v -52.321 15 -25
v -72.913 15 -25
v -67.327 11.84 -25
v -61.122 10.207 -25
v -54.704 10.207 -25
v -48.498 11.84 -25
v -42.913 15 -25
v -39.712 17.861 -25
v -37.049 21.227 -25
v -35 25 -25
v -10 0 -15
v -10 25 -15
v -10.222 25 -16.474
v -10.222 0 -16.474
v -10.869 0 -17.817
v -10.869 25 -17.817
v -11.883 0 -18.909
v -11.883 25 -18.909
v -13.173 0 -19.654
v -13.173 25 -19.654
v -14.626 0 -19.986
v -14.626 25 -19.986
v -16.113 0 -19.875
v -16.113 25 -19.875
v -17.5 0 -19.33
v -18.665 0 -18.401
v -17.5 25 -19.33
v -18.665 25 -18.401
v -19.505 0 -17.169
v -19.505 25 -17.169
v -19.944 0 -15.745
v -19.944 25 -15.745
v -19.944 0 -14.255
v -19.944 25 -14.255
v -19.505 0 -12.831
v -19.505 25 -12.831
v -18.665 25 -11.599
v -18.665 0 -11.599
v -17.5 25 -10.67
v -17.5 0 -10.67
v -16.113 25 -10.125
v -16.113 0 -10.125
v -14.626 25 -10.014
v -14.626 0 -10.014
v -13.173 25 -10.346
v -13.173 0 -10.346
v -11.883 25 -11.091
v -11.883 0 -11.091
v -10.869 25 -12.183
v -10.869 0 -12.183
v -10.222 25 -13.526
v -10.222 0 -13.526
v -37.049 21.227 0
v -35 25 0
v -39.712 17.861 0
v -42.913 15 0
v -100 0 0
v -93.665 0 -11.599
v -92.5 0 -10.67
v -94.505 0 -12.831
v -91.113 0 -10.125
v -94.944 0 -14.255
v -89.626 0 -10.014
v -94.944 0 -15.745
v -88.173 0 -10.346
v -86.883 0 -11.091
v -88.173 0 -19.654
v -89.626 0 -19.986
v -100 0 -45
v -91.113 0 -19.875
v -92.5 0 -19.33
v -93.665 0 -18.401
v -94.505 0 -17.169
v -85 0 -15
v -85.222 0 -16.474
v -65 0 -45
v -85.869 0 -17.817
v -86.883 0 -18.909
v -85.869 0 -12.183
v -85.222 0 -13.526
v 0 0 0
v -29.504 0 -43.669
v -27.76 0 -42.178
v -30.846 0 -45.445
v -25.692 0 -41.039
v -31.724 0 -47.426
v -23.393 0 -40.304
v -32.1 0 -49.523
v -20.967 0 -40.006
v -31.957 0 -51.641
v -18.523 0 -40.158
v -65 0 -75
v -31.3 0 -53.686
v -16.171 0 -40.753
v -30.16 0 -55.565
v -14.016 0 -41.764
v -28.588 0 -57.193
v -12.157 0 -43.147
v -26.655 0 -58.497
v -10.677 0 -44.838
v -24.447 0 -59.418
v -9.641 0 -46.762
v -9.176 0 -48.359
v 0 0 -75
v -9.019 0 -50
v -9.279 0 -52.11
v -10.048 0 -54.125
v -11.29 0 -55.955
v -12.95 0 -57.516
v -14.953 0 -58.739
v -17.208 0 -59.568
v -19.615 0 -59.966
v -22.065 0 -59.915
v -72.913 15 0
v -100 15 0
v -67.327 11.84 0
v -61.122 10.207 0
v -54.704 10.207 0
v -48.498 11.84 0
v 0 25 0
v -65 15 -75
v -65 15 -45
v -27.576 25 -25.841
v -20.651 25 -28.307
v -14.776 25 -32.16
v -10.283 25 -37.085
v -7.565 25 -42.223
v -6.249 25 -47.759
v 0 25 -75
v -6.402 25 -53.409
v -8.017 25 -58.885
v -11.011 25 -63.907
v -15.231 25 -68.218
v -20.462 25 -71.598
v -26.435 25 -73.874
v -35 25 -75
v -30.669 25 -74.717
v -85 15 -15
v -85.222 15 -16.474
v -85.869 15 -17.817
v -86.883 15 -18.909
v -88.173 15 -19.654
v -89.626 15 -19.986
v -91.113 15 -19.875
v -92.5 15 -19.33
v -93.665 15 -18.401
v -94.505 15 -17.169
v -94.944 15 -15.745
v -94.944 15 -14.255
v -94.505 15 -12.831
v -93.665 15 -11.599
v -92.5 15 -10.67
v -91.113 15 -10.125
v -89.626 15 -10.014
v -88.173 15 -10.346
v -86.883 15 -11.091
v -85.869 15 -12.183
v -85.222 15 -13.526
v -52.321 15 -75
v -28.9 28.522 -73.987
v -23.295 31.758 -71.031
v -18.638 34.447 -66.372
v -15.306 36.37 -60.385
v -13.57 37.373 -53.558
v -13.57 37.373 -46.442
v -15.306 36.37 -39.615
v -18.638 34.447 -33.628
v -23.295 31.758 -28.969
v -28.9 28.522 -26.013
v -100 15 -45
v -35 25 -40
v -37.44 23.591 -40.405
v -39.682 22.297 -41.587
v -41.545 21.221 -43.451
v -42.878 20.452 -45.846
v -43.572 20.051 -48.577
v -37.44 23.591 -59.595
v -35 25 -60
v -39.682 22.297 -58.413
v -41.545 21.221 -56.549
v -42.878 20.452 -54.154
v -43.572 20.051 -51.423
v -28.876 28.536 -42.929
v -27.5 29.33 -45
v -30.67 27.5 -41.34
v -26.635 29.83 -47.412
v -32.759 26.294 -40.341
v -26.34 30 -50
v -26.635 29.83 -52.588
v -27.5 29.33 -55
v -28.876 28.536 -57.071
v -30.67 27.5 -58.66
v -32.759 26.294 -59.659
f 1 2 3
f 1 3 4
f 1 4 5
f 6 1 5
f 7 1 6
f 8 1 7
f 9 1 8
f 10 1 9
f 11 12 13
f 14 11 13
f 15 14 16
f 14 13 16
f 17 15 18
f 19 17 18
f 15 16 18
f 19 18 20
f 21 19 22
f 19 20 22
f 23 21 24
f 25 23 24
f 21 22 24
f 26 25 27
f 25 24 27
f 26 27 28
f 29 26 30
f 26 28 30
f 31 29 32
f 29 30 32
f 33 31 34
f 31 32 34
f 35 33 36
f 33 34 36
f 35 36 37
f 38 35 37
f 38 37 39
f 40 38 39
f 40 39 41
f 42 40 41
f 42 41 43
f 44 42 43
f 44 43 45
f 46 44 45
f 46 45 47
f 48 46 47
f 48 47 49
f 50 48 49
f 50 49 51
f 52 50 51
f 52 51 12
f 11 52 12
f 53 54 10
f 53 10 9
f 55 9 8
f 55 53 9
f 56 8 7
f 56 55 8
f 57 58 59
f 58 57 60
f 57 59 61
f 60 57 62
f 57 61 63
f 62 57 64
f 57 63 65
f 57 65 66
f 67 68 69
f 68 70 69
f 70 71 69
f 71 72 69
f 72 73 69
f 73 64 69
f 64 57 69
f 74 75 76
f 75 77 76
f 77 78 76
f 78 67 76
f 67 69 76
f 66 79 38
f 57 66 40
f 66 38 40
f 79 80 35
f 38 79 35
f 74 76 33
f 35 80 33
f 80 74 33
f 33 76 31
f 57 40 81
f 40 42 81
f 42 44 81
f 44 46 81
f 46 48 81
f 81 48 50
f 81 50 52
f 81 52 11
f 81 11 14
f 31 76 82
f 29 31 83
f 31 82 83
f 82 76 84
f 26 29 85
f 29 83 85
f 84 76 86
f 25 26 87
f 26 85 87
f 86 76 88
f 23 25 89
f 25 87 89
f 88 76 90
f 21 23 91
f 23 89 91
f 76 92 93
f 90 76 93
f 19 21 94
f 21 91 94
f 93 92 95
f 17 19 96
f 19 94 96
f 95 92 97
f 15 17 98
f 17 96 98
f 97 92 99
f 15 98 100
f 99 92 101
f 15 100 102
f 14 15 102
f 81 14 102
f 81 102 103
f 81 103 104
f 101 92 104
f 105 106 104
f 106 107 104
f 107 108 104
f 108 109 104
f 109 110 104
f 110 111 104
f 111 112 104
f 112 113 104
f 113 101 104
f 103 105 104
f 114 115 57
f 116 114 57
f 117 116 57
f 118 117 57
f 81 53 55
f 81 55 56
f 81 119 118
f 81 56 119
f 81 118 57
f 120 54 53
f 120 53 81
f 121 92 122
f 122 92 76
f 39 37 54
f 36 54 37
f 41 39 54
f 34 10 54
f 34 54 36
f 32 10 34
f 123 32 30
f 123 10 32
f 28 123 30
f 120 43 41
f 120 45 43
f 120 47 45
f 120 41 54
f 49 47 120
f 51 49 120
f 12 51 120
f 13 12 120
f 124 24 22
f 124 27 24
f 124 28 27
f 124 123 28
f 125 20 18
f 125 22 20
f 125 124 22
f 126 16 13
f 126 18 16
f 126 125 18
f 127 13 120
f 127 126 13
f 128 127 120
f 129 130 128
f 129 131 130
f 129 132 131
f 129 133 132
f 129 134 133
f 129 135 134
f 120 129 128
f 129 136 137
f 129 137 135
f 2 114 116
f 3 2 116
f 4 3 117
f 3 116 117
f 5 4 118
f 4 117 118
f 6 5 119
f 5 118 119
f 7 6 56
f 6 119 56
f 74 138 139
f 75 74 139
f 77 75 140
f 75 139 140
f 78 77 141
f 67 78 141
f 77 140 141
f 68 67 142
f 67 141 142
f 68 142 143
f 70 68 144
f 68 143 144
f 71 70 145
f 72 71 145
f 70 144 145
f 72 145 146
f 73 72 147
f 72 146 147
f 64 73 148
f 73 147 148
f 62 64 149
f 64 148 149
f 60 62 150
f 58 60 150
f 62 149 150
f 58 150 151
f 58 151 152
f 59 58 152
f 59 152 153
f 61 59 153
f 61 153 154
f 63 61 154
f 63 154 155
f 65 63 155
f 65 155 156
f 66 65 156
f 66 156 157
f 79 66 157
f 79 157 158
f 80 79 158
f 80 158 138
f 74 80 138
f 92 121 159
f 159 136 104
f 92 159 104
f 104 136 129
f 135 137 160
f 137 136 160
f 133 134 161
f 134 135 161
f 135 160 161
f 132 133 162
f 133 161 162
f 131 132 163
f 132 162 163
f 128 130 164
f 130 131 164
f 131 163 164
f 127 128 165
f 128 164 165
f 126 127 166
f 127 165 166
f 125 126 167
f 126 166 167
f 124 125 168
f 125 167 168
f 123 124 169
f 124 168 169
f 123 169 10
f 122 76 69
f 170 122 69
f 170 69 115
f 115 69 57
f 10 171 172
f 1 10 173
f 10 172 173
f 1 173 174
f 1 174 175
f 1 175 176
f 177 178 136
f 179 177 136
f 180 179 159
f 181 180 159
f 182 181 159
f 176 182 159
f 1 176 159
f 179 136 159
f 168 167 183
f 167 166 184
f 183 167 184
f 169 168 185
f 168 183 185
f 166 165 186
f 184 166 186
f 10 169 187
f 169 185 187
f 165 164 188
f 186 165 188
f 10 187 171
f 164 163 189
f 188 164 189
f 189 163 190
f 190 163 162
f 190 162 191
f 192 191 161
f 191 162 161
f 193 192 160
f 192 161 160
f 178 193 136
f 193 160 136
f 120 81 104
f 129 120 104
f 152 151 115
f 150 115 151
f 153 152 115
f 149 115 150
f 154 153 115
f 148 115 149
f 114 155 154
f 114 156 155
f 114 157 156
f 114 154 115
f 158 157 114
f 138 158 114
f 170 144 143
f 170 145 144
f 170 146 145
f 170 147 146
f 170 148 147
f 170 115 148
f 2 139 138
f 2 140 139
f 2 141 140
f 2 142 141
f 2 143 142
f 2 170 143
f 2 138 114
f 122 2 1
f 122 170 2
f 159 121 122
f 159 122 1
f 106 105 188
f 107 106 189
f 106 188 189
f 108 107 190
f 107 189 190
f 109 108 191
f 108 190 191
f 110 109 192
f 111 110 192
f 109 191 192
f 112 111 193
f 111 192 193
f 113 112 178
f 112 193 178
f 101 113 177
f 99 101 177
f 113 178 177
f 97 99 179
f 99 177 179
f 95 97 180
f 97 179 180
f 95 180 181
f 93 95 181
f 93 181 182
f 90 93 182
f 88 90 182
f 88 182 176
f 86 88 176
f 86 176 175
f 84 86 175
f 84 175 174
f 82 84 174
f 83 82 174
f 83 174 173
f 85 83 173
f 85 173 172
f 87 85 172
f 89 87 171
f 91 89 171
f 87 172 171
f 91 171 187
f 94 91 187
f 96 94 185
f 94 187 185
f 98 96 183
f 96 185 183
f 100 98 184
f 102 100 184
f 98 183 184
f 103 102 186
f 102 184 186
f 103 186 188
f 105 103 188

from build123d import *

# Parameters (mm, degrees)
IZIM1_W                     = 35
IZIM1_H                     = 75
Y_KSEKLIK_EKSTR_ZYON1_DEPTH = 25
Y_KSEKLIK_EKSTR_ZYON2_DEPTH = 15
KES_EKSTR_ZYON1_DEPTH       = 25
Y_KSEKLIK_EKSTR_ZYON3_DEPTH = 25
IZIM3_R                     = 5
KES_EKSTR_ZYON2_DEPTH       = 25
IZIM4_R                     = 5
KES_EKSTR_ZYON3_DEPTH       = 128.47548784
Y_KSEKLIK_EKSTR_ZYON4_DEPTH = 50
Y_KSEKLIK_EKSTR_ZYON5_REACH = 117.077
IZIM7_R                     = 10
KES_EKSTR_ZYON4_DEPTH       = 116.076968672


with BuildPart() as part:
    # Çizim1 → Yükseklik-Ekstrüzyon1 (new body)
    with BuildSketch(Plane(origin=(0, 0, 0), x_dir=(1, 0, 0), z_dir=(0, 1, 0))):
        with Locations((-17.5, 37.5)):
            Rectangle(IZIM1_W, IZIM1_H)
    extrude(amount=Y_KSEKLIK_EKSTR_ZYON1_DEPTH)

    # Çizim1<4> → Yükseklik-Ekstrüzyon2 (add)
    with BuildSketch(Plane(origin=(0, 0, 0), x_dir=(1, 0, 0), z_dir=(0, 1, 0))):
        Polygon((-35, 75), (-65, 75), (-65, 45), (-100, 45), (-100, 0), (-35, 0), align=None)
    extrude(amount=Y_KSEKLIK_EKSTR_ZYON2_DEPTH)

    # Çizim2 → Kes-Ekstrüzyon1 (cut)
    with BuildSketch(Plane.XY):
        with BuildLine():
            Line((-42.912878475, 15), (-72.912878475, 15))
            ThreePointArc((-72.912878475, 15), (-57.912878475, 10), (-42.912878475, 15))
        make_face()
    extrude(amount=-KES_EKSTR_ZYON1_DEPTH, mode=Mode.SUBTRACT)

    # Çizim2<3> → Yükseklik-Ekstrüzyon3 (add)
    with BuildSketch(Plane.XY):
        with BuildLine():
            ThreePointArc((-35, 25), (-38.30811914, 19.486992186), (-42.912878475, 15))
            Line((-42.912878475, 15), (-35, 15))
            Line((-35, 15), (-35, 25))
        make_face()
    extrude(amount=-Y_KSEKLIK_EKSTR_ZYON3_DEPTH)

    # Çizim3 → Kes-Ekstrüzyon2 (cut)
    with BuildSketch(Plane(origin=(0, 15, 0), x_dir=(1, 0, 0), z_dir=(0, 1, 0))):
        with Locations((-90, 15)):
            Circle(IZIM3_R)
    extrude(amount=-KES_EKSTR_ZYON2_DEPTH, mode=Mode.SUBTRACT)

    # Çizim4 → Kes-Ekstrüzyon3 (cut, through all)
    with BuildSketch(Plane(origin=(0, 25, 0), x_dir=(1, 0, 0), z_dir=(0, 1, 0))):
        with Locations((-15, 15)):
            Circle(IZIM4_R)
    extrude(amount=-KES_EKSTR_ZYON3_DEPTH, mode=Mode.SUBTRACT)

    # Çizim5 → Yükseklik-Ekstrüzyon4 (add)
    with BuildSketch(Plane.XY.offset(-75)):
        Polygon((-35, 25), (-52.320508076, 15), (-35, 15), align=None)
    extrude(amount=Y_KSEKLIK_EKSTR_ZYON4_DEPTH)

    # Yükseklik-Ekstrüzyon5: up to this face of the body (flat: up to its plane)
    y_kseklik_ekstr_zyon5_end = Plane(part.part.faces().sort_by_distance((-17.577106857, 25, -38.193961712))[0])
    # Çizim6 → Yükseklik-Ekstrüzyon5 (add, up to the picked face)
    with BuildSketch(Plane(origin=(-19.575317547, 33.905444566, 0), x_dir=(0.8660254037844379, 0.5000000000000013, 0), z_dir=(-0.5000000000000013, 0.8660254037844379, 0)), mode=Mode.PRIVATE) as y_kseklik_ekstr_zyon5_sk1:
        with BuildLine():
            Line((-17.810889132, 25), (-17.810889132, 75))
            ThreePointArc((-17.810889132, 75), (7.189110868, 50), (-17.810889132, 25))
        make_face()
    y_kseklik_ekstr_zyon5_tool1 = split(extrude(y_kseklik_ekstr_zyon5_sk1.sketch, amount=-Y_KSEKLIK_EKSTR_ZYON5_REACH, mode=Mode.PRIVATE), bisect_by=y_kseklik_ekstr_zyon5_end, keep=Keep.BOTH, mode=Mode.PRIVATE)
    add(y_kseklik_ekstr_zyon5_tool1.solids().sort_by(Axis((-25.811185, 30.305165, -50), (0.5000000000000013, -0.8660254037844379, 0)))[0])

    # Çizim7 → Kes-Ekstrüzyon4 (cut, through all)
    with BuildSketch(Plane(origin=(-19.575317547, 33.905444566, 0), x_dir=(0.8660254037844379, 0.5000000000000013, 0), z_dir=(-0.5000000000000013, 0.8660254037844379, 0))):
        with Locations((-17.810889132, 50)):
            Circle(IZIM7_R)
    extrude(amount=-KES_EKSTR_ZYON4_DEPTH, mode=Mode.SUBTRACT)


solid = part.part
